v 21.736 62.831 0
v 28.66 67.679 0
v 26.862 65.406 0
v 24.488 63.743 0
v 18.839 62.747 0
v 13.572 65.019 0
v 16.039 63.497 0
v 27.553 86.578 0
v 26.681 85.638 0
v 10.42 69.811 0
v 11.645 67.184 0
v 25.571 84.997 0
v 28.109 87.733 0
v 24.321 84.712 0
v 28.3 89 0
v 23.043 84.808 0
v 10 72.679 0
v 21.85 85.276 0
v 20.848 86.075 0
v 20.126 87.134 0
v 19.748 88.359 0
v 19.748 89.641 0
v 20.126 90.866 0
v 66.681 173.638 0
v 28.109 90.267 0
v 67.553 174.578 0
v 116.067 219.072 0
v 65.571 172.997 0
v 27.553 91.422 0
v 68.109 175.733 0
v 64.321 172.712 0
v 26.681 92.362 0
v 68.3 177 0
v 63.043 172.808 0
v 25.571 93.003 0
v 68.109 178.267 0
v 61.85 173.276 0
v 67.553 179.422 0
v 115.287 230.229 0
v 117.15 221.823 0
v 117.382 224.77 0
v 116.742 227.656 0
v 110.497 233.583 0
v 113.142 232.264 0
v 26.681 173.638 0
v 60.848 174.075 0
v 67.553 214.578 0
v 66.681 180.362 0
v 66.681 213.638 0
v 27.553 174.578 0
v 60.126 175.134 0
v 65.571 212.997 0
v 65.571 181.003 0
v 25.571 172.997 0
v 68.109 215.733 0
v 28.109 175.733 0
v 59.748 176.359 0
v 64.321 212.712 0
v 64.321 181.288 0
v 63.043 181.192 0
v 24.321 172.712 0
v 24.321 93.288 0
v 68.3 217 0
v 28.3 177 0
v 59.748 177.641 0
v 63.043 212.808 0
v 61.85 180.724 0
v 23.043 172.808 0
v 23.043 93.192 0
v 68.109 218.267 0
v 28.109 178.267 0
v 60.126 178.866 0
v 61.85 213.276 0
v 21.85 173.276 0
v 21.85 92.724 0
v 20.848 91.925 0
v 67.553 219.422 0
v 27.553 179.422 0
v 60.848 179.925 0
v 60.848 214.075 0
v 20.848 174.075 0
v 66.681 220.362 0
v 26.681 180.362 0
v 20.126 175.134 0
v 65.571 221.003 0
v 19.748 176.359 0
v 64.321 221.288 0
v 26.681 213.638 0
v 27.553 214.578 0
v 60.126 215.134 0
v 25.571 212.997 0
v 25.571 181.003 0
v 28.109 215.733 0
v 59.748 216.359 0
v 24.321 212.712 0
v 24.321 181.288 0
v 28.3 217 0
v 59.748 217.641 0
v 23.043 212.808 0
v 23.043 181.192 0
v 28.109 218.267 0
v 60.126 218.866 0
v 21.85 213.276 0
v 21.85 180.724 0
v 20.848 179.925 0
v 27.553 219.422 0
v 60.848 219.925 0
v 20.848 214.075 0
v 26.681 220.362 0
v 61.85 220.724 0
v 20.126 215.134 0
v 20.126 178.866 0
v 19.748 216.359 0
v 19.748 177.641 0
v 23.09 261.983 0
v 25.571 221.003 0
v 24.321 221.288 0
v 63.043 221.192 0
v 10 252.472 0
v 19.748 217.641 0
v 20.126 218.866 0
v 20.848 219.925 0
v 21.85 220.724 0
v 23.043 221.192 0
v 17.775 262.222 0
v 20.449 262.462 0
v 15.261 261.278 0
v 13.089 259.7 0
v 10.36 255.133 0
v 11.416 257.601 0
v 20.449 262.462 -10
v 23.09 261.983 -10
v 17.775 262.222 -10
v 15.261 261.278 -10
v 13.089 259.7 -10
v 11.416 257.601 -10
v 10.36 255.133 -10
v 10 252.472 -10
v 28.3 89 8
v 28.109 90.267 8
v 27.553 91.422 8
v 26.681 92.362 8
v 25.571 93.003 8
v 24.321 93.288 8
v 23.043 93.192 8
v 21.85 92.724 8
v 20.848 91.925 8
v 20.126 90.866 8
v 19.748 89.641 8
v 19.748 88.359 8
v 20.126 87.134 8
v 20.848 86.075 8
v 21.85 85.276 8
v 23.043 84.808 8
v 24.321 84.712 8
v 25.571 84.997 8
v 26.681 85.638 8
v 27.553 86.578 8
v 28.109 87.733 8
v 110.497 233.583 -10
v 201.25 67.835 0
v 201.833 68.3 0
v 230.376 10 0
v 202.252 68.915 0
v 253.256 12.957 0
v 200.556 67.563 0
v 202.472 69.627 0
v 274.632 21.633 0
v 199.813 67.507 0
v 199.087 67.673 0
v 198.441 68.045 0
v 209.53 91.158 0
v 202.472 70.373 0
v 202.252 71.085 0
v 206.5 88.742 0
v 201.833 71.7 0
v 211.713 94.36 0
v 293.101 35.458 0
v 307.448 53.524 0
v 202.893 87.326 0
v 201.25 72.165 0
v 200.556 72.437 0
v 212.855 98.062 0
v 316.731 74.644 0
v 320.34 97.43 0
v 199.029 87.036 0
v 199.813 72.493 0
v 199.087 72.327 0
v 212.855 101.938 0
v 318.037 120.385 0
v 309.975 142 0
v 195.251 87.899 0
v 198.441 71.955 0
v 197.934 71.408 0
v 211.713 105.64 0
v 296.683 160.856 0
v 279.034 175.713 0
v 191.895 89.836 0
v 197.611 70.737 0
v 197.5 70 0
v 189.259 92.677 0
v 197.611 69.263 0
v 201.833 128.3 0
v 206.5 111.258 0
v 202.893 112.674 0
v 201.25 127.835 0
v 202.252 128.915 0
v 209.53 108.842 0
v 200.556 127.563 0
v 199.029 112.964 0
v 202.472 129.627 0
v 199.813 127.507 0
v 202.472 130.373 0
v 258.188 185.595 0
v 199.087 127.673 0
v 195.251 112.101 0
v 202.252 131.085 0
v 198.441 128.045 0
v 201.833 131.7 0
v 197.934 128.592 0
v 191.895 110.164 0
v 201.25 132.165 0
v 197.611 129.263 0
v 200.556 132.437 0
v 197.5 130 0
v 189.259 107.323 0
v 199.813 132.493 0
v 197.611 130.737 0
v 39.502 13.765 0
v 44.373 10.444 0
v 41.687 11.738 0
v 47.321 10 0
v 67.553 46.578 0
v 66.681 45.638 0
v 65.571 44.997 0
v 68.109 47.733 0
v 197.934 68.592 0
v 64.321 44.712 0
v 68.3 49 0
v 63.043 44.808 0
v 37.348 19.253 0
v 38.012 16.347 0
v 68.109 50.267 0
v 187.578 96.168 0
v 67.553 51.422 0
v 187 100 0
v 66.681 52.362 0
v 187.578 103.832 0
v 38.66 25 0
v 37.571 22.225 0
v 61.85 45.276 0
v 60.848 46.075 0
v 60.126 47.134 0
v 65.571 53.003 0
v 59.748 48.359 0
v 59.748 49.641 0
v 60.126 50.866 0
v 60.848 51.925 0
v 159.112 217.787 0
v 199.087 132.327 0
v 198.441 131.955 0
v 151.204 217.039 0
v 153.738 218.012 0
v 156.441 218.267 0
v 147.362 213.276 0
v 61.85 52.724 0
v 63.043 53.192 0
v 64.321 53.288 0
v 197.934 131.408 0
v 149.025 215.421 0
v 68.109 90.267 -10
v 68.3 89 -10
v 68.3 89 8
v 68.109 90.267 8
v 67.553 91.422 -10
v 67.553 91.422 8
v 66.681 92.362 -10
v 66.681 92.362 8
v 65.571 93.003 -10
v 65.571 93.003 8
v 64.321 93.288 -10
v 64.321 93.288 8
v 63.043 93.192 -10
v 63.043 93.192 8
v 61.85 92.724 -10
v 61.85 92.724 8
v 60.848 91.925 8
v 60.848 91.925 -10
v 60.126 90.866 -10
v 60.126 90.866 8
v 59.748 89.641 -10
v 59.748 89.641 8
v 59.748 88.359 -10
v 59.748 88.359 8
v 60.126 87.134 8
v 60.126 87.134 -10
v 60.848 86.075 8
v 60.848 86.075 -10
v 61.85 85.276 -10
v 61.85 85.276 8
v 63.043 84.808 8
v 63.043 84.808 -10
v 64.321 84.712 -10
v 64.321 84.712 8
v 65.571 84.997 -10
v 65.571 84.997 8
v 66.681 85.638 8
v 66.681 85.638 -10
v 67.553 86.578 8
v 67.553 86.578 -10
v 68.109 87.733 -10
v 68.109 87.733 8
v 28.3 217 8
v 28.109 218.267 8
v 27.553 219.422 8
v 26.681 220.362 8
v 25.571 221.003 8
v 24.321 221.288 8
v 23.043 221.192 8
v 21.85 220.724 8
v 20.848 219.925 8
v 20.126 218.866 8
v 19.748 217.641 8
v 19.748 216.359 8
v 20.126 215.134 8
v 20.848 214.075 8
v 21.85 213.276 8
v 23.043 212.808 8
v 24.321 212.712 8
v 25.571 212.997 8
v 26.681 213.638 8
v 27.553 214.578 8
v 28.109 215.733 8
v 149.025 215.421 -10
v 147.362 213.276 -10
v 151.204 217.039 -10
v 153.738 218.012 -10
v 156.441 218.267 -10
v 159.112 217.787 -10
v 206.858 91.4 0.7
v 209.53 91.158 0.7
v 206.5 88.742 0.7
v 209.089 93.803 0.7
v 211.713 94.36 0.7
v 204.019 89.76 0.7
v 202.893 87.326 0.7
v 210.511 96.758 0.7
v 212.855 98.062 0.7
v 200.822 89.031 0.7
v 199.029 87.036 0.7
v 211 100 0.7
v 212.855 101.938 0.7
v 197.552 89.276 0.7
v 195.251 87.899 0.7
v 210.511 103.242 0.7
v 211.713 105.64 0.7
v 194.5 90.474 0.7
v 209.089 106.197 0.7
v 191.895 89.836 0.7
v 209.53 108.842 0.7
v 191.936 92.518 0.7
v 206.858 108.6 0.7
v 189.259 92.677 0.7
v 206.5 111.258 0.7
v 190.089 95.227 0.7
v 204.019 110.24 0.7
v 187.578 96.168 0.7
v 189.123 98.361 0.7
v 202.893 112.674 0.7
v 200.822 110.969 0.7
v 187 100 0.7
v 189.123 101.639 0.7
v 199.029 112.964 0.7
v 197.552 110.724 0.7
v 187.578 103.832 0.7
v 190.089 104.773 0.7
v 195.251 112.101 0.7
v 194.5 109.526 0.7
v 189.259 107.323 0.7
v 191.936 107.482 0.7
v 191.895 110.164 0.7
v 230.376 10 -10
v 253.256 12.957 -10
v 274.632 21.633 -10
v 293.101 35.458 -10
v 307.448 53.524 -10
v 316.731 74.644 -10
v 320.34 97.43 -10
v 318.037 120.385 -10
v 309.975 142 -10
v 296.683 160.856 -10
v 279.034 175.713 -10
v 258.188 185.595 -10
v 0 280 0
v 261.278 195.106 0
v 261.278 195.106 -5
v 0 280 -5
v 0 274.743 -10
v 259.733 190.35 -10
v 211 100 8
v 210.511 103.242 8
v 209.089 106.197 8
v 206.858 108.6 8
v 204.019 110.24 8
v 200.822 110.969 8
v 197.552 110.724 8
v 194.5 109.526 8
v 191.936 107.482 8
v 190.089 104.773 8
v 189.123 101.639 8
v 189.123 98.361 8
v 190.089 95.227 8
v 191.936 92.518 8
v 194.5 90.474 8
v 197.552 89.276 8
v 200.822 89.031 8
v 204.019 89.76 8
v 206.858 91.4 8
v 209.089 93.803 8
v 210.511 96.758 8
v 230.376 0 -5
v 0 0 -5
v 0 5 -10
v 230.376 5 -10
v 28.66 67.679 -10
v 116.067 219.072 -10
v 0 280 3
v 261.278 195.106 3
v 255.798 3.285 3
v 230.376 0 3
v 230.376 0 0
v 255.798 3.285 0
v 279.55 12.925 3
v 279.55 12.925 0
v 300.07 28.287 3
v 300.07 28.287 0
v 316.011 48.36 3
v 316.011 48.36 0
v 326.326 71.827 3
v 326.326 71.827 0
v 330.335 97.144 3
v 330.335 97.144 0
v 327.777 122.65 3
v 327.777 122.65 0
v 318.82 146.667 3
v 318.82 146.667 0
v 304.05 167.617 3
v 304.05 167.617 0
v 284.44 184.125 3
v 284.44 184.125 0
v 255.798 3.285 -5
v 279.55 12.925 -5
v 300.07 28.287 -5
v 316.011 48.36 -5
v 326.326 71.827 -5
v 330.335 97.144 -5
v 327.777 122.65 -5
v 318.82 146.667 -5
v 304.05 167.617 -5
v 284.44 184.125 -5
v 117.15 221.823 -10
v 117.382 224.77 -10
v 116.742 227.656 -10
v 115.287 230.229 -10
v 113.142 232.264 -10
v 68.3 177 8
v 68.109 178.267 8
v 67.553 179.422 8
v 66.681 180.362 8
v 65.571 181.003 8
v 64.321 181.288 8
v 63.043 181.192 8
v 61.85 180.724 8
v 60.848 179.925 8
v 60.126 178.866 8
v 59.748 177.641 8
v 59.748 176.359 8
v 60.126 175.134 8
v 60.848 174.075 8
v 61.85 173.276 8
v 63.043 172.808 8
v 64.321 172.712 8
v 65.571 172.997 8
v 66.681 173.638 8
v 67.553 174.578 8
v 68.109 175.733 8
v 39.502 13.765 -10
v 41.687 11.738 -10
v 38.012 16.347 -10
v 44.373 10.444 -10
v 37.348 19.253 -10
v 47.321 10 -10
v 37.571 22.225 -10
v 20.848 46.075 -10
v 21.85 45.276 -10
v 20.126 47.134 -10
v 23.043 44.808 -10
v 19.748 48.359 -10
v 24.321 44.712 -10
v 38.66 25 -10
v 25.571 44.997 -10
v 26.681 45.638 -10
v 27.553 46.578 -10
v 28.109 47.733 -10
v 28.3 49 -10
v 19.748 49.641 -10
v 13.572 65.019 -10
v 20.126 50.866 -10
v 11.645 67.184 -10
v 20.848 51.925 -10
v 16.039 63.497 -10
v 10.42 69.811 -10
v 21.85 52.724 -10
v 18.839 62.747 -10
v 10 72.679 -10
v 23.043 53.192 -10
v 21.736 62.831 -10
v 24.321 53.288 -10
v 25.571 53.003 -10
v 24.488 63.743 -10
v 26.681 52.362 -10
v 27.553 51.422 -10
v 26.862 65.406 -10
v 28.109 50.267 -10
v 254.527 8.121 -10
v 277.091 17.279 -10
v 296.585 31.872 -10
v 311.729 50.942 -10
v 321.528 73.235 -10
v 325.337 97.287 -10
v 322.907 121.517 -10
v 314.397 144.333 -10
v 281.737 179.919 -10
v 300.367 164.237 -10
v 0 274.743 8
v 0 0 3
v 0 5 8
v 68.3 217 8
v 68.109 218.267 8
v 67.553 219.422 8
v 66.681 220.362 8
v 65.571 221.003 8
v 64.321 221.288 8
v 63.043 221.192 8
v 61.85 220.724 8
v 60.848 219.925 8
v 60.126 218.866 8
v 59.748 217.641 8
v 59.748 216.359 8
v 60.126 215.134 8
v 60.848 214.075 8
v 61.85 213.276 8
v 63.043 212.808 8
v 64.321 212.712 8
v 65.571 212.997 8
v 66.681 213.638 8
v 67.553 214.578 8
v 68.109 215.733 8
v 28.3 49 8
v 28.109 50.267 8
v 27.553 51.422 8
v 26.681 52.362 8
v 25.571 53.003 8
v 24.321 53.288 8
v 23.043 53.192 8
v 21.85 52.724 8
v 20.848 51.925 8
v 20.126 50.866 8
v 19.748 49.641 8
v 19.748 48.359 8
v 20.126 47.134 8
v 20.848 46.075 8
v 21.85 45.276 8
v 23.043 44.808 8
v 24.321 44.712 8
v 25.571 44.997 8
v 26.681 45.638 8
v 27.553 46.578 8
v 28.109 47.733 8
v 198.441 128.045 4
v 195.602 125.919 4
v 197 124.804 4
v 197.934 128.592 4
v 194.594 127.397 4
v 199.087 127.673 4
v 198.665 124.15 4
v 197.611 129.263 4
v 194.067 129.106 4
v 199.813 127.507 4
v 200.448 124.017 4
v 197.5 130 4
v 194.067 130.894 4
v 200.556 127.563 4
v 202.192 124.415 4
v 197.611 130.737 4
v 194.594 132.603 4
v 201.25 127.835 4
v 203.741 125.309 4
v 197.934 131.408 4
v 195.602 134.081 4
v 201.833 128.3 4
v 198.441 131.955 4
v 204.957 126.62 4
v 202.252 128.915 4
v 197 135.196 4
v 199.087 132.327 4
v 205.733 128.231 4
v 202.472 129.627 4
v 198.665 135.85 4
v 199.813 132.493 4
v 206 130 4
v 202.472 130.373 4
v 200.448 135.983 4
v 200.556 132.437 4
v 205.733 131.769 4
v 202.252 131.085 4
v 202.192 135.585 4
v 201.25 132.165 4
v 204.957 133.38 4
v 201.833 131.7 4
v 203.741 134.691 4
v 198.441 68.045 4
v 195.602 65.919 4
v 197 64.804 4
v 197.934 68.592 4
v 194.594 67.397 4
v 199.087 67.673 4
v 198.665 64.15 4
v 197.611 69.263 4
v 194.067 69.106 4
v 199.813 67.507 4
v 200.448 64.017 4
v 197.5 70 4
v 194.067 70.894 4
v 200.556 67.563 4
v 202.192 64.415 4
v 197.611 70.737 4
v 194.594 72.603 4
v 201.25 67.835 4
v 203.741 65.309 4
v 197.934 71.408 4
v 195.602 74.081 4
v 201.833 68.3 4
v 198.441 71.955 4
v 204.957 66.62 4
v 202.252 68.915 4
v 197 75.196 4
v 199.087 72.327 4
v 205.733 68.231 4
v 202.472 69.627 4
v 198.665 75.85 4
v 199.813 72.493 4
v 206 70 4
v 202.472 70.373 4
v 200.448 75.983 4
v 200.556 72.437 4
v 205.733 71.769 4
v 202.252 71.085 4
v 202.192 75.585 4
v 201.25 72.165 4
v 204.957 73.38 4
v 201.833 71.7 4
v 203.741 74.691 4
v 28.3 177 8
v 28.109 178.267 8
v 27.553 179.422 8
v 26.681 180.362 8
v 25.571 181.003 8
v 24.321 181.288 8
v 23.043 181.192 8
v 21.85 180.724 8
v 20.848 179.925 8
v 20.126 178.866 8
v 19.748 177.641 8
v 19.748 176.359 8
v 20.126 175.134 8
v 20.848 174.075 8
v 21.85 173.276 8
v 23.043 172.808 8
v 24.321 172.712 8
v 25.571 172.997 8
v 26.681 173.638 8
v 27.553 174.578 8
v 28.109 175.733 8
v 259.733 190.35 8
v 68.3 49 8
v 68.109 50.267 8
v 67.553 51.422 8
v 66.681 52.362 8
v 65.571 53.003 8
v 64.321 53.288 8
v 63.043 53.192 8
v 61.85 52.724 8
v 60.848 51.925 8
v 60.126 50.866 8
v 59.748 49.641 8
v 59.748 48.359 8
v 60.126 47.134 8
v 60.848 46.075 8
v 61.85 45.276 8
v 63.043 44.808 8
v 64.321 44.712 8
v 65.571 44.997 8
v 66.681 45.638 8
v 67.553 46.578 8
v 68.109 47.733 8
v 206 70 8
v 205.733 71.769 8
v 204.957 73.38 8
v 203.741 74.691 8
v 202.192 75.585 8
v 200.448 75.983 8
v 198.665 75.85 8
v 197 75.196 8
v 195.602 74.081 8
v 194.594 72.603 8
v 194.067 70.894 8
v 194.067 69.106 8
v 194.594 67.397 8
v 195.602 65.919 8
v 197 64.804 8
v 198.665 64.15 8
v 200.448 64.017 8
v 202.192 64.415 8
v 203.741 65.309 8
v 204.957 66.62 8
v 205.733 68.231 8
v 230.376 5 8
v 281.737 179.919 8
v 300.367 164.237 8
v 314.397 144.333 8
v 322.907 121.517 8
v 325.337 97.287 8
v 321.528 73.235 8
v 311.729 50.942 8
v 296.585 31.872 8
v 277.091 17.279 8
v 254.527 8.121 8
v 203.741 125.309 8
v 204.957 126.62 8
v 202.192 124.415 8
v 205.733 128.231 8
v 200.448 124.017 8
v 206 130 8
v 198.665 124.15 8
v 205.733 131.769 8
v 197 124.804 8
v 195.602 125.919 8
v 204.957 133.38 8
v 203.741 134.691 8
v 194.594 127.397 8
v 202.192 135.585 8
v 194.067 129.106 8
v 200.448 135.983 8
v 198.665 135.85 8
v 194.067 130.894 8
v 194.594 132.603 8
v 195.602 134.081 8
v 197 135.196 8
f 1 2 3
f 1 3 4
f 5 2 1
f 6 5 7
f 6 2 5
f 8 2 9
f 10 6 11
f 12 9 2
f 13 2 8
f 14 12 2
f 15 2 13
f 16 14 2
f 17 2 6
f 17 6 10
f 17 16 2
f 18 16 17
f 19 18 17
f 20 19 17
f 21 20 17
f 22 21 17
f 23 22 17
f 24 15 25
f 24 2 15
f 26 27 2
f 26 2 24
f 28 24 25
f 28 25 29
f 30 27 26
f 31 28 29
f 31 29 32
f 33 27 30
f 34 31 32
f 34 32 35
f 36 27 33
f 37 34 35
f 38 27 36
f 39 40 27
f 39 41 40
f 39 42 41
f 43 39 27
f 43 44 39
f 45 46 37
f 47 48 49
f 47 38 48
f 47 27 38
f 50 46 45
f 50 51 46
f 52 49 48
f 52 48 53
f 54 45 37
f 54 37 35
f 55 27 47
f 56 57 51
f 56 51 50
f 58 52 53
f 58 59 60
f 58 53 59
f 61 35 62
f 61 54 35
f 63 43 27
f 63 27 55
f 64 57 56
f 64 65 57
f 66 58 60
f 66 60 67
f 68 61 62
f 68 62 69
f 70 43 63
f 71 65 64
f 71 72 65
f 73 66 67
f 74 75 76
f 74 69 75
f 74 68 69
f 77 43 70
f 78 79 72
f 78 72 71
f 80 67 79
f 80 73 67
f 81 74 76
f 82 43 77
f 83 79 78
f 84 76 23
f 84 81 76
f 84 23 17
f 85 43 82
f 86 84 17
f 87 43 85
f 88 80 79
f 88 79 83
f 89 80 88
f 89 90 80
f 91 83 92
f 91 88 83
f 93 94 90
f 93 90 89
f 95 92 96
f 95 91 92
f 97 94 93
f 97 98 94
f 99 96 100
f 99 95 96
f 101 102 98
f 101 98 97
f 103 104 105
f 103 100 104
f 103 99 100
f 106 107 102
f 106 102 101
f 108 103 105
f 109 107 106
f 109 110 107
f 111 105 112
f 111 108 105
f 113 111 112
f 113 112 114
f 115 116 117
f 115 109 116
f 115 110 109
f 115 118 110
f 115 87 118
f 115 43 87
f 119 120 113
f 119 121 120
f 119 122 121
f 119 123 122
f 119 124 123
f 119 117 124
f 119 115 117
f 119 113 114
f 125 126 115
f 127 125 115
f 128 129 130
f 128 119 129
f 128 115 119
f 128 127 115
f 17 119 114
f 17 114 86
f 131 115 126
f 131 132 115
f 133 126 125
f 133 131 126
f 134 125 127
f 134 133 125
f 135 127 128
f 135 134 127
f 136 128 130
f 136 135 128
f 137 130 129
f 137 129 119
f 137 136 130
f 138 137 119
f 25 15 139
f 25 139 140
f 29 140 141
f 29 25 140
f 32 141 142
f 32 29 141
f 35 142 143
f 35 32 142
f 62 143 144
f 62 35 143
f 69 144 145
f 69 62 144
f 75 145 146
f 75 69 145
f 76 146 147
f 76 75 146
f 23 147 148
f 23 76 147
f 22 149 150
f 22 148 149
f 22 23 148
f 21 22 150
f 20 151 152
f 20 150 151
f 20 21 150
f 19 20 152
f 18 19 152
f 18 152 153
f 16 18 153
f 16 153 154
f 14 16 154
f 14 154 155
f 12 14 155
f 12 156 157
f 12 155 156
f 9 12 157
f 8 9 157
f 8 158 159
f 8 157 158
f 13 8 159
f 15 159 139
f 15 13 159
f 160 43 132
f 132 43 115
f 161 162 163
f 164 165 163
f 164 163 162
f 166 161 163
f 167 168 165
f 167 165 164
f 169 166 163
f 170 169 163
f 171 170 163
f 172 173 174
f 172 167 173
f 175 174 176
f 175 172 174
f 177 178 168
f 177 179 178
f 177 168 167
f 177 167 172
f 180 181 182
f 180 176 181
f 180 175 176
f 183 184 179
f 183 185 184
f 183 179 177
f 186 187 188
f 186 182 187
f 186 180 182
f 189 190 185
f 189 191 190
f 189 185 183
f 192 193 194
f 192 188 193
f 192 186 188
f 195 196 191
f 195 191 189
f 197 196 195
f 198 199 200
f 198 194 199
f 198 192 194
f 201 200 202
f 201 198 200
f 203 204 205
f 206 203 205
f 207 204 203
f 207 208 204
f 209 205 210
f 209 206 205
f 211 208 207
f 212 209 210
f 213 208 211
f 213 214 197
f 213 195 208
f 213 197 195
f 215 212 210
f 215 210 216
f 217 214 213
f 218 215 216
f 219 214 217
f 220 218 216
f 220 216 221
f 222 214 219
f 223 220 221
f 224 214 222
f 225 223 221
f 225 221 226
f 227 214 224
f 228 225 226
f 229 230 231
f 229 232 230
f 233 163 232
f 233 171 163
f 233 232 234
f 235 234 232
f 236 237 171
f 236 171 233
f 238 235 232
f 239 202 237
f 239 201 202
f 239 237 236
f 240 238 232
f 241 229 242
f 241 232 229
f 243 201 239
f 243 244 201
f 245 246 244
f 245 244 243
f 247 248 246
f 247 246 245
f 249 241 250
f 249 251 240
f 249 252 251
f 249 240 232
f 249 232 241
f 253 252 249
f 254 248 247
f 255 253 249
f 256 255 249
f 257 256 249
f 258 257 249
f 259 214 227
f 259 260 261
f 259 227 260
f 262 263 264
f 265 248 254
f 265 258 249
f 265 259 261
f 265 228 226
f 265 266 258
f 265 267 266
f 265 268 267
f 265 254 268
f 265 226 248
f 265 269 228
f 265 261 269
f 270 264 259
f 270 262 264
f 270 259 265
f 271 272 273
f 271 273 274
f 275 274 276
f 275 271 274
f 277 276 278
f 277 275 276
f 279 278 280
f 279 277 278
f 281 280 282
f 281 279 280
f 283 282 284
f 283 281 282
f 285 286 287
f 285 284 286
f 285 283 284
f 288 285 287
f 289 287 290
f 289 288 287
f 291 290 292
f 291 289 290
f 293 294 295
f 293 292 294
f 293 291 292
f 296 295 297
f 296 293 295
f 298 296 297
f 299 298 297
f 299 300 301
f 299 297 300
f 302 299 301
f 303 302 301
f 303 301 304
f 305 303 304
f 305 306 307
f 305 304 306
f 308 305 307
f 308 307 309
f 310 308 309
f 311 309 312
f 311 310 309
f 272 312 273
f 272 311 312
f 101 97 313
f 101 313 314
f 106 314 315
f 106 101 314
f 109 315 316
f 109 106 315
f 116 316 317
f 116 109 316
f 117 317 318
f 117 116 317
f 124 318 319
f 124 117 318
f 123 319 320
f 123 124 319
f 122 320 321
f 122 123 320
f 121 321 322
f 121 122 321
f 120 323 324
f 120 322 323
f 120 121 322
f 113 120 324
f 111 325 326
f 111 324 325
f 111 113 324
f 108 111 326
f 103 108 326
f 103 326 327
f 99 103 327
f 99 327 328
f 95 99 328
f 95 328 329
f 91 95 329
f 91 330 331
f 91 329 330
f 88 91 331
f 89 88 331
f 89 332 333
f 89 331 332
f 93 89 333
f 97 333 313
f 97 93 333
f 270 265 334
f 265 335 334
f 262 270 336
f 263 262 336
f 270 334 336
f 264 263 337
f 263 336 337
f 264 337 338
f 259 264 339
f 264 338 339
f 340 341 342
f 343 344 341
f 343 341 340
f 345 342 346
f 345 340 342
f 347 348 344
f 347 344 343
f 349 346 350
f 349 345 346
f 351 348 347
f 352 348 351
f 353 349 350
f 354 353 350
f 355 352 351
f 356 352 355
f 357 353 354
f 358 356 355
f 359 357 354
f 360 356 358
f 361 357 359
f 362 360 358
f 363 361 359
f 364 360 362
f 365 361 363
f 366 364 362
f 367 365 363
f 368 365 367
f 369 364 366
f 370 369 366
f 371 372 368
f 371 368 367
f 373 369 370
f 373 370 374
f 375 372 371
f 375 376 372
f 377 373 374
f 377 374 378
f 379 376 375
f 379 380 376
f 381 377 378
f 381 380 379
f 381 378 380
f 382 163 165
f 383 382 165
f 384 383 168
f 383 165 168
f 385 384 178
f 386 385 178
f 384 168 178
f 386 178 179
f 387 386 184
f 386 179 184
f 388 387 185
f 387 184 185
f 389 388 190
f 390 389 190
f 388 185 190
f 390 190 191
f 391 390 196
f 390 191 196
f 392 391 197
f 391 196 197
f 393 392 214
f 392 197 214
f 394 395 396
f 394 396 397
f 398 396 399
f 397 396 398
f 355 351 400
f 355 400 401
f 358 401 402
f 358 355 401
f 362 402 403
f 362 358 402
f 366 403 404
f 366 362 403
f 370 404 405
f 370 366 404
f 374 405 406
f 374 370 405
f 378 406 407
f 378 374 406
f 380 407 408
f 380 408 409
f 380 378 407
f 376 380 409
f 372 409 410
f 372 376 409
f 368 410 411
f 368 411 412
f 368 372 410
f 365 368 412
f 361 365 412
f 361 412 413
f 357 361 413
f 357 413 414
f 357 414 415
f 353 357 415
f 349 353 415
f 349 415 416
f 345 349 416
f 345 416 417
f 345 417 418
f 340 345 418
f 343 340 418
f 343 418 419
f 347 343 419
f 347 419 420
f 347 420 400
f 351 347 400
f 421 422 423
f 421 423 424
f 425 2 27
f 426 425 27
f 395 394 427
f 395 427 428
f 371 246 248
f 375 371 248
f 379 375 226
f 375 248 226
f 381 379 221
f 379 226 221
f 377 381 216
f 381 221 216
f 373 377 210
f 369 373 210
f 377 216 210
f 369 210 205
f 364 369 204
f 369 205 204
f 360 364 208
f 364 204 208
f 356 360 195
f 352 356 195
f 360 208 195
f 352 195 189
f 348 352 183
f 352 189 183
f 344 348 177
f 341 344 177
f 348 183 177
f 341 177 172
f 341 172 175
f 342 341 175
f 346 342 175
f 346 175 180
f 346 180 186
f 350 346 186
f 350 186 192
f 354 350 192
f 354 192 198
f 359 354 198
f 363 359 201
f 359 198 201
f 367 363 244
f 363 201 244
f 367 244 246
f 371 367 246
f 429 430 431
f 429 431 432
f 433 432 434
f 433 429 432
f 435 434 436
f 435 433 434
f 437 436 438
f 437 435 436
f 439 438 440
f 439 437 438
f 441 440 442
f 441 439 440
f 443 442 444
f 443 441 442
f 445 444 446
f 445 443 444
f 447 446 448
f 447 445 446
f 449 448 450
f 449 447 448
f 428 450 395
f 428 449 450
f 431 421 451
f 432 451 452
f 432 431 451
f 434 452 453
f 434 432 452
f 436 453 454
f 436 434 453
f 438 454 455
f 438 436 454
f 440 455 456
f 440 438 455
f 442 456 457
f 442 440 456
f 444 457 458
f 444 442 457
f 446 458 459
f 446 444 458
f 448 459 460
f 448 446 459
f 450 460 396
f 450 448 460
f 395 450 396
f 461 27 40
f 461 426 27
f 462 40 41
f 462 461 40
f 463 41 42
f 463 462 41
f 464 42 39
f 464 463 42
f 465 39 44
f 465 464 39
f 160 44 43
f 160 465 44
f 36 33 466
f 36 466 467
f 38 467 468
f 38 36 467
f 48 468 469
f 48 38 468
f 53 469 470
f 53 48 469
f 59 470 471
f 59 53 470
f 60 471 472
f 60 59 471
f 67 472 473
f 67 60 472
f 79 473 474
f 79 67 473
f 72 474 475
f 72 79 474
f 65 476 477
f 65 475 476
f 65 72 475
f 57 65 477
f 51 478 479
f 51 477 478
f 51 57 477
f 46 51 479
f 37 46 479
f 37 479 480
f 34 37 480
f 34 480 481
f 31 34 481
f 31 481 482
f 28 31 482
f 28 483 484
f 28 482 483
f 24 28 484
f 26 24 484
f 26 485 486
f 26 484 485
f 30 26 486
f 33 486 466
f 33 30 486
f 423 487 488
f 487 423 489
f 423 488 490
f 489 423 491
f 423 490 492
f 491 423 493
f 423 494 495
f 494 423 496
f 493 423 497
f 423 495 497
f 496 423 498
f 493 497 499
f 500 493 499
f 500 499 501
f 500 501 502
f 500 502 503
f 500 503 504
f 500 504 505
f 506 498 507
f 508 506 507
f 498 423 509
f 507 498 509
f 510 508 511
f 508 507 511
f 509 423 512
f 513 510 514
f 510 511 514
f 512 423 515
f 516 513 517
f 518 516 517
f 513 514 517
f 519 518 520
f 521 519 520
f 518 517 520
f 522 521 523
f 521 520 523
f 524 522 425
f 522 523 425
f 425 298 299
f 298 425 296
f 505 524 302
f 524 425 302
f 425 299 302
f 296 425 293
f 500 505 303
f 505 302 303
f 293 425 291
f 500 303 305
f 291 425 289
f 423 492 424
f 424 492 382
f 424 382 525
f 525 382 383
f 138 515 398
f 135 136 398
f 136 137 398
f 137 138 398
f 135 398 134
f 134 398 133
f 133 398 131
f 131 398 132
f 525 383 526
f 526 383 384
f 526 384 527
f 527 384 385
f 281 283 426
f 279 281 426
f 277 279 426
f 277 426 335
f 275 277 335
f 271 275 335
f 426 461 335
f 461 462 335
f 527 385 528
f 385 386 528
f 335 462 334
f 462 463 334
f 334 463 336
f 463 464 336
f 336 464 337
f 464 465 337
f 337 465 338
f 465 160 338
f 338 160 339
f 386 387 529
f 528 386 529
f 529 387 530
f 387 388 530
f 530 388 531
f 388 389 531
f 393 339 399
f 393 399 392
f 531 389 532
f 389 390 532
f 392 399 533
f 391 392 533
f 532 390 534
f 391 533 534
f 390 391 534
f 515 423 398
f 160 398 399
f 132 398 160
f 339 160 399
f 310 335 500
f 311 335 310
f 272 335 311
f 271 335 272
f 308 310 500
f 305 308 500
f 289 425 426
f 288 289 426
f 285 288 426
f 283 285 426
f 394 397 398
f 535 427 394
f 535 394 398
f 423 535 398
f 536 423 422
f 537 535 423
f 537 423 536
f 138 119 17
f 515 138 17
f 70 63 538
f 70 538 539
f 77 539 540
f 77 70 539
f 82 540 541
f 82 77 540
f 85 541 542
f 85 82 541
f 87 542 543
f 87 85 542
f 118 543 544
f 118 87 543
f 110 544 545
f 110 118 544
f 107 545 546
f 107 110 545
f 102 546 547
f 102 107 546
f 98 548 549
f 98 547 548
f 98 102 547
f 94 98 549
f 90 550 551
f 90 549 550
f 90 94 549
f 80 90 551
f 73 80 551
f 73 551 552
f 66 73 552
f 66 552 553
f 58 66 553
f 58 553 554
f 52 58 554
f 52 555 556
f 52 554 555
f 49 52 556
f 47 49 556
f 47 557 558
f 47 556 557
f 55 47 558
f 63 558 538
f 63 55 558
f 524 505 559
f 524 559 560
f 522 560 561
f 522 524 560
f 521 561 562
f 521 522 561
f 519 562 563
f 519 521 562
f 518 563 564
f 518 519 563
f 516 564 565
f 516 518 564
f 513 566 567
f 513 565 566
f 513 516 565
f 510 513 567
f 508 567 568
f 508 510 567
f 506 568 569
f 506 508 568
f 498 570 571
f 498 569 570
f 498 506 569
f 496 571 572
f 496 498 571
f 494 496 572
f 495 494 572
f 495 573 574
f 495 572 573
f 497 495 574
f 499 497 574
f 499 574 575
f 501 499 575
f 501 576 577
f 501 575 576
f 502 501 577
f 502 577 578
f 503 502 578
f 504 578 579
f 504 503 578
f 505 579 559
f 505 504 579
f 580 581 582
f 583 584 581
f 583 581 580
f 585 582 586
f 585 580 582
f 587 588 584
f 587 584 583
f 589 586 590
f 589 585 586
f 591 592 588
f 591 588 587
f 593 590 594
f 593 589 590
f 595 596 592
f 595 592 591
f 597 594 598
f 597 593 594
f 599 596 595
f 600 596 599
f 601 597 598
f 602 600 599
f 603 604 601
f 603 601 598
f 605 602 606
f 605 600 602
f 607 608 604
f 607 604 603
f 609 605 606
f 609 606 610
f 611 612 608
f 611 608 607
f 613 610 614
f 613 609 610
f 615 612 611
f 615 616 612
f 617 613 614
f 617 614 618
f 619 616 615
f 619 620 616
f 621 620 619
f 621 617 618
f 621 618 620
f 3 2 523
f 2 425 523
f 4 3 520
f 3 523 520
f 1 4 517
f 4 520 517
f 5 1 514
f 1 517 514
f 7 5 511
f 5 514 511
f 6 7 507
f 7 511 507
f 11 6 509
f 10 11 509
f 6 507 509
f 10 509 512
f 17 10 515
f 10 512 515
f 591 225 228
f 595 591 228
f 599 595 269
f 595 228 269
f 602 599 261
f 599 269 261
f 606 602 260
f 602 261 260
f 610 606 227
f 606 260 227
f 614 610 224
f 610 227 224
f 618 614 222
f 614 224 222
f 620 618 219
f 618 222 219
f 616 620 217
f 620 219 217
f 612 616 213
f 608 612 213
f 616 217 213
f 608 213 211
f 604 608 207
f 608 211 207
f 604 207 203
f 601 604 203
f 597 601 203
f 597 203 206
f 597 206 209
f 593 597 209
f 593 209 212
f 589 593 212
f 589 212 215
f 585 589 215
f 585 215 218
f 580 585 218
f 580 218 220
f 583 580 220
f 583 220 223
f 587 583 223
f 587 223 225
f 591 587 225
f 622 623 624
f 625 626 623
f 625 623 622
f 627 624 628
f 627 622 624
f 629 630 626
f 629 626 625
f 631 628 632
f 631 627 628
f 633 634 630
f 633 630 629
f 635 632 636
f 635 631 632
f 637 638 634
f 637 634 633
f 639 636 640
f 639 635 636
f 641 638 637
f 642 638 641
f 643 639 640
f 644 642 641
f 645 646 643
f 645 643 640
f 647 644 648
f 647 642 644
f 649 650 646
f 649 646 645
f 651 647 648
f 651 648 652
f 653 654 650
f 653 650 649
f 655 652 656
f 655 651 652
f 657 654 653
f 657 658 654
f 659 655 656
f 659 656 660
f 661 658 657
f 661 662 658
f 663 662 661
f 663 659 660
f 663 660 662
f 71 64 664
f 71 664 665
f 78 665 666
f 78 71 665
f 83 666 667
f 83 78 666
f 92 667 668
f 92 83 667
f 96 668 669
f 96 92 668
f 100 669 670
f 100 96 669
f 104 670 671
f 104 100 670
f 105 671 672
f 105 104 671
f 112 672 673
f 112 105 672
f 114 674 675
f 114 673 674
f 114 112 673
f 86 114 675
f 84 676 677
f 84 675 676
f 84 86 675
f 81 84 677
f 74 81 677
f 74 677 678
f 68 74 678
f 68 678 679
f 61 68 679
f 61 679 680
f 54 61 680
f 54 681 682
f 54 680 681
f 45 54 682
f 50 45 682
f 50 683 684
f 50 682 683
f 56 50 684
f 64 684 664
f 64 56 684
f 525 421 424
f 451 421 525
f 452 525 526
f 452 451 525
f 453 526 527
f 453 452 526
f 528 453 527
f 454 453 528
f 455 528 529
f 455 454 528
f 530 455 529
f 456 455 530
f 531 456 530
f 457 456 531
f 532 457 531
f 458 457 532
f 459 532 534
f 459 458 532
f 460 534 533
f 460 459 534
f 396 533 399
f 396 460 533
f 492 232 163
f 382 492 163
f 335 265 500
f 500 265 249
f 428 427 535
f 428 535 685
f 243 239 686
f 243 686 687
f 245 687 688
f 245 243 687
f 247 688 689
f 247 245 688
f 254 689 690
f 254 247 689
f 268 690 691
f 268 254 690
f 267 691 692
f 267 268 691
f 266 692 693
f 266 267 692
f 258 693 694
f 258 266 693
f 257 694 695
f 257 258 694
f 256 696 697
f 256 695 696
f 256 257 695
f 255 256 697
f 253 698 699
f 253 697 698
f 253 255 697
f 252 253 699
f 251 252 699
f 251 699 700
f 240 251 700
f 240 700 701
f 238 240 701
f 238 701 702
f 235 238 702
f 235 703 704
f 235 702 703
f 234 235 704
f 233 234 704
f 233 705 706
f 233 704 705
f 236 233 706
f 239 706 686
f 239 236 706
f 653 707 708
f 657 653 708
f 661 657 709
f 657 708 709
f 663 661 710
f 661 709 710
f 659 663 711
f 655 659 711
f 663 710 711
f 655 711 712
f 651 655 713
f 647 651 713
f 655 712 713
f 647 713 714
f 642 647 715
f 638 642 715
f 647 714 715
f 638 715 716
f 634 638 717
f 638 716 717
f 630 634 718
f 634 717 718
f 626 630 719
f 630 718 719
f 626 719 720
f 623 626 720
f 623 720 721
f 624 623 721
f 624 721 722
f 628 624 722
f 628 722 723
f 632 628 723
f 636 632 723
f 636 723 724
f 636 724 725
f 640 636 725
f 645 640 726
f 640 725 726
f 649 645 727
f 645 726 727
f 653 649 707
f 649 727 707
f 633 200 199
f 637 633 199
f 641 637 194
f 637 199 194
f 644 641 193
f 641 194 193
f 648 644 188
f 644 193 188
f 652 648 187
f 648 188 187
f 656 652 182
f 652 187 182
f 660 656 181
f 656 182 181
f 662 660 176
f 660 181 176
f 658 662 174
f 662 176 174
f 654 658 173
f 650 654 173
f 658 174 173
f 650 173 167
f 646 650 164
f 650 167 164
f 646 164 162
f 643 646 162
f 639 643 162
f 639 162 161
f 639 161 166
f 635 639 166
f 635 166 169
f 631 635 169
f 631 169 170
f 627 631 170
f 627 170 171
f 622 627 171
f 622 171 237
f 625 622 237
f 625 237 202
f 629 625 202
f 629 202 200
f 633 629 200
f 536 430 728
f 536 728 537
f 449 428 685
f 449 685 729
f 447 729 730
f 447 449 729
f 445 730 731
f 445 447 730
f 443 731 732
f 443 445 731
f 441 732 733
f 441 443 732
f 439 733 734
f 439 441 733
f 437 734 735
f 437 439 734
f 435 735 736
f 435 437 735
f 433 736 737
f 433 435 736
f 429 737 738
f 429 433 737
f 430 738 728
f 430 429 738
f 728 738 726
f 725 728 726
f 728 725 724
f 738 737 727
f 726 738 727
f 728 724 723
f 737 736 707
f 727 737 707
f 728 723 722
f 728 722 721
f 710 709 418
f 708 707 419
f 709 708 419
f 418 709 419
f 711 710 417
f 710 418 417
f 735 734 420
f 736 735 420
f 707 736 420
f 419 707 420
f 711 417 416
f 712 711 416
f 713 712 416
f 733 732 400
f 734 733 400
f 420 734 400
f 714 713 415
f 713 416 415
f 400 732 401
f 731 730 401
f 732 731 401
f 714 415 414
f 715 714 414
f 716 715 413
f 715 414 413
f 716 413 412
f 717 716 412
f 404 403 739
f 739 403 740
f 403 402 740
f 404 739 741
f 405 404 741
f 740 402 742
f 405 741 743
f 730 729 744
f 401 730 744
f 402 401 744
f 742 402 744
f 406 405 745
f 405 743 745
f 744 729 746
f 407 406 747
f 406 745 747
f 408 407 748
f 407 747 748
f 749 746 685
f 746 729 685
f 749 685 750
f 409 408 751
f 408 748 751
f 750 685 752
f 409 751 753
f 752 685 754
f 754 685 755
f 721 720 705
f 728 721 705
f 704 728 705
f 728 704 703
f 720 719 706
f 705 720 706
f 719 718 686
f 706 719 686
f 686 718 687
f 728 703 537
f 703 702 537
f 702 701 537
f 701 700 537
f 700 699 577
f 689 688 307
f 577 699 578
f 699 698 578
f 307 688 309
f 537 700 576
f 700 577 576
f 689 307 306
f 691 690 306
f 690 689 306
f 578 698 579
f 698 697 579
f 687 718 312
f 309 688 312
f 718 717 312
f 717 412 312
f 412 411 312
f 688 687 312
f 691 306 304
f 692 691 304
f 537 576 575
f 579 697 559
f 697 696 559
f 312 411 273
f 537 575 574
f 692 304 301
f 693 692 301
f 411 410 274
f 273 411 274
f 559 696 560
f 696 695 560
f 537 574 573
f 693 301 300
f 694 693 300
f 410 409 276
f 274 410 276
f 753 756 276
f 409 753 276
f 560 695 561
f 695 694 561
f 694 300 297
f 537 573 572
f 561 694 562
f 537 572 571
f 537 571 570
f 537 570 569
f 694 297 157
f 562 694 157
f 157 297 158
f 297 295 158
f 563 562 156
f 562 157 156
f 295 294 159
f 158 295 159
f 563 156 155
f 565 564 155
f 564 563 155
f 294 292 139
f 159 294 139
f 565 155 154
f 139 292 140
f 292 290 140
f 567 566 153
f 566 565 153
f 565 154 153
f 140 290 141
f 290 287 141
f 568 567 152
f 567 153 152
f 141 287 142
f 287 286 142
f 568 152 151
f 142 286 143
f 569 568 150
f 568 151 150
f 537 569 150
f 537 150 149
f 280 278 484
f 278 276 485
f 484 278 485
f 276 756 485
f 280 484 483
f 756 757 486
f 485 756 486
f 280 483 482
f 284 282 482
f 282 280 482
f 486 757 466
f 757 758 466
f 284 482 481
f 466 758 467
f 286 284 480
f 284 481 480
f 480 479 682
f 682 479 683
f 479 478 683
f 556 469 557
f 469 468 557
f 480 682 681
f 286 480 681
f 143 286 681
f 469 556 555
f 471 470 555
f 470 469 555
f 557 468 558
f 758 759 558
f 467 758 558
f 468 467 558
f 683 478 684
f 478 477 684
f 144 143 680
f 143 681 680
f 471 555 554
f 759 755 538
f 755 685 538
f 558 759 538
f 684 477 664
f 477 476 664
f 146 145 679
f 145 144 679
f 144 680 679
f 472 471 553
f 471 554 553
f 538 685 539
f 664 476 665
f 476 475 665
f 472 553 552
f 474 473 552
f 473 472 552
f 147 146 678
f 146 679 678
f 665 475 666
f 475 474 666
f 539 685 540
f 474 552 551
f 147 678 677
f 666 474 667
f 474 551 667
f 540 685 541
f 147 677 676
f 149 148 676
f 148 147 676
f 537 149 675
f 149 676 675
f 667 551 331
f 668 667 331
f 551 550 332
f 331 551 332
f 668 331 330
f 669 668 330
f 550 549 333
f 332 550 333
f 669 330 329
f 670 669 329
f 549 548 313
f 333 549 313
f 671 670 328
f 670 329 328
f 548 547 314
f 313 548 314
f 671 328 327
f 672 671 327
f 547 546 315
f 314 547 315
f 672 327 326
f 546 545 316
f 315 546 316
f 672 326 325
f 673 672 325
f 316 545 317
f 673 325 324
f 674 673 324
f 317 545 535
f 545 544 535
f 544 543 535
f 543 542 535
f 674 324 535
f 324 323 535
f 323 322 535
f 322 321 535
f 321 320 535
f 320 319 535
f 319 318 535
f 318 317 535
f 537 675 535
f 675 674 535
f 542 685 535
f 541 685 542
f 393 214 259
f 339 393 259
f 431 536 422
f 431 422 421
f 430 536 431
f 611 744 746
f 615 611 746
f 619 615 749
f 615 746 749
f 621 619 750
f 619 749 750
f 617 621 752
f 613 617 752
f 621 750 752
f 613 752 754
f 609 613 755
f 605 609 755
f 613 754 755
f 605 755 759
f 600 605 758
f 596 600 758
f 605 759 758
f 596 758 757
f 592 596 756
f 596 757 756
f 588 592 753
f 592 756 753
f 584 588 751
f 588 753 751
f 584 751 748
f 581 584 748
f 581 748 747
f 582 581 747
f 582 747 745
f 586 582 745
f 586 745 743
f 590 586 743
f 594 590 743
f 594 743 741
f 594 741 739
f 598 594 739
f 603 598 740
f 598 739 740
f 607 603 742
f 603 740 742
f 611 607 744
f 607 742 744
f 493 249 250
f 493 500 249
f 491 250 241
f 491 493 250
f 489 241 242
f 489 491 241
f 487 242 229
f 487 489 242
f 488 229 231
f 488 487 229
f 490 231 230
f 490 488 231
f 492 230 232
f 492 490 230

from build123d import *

# Parameters (mm, degrees)
SKETCH_1_R               = 11
EXTRUDE_1_DEPTH          = 8
FILLET_1_R               = 100
EXTRUDE_2_DEPTH          = 10
FILLET_2_R               = 10
CHAMFER_1_SIZE           = 5
SKETCH_4_R               = 13
CUT_EXTRUDE_1_DEPTH      = 0.7
SKETCH_5_R               = 2.5
CUT_EXTRUDE_2_DEPTH      = 434.184093957
SKETCH_6_R               = 6
CUT_EXTRUDE_3_DEPTH      = 4
CUT_EXTRUDE_4_DEPTH      = 434.442567426
CUT_EXTRUDE_4_DEPTH_BACK = 434.442567426
SKETCH_7_R               = 4.3


with BuildPart() as part:
    # 草图1 → 凸台-拉伸1 (new body)
    with BuildSketch(Plane.XY):
        Polygon((0, 0), (0, 280), (861.751390409, 0), align=None)
        with Locations((200, 100)):
            Circle(SKETCH_1_R, mode=Mode.SUBTRACT)
    extrude(amount=EXTRUDE_1_DEPTH)

    # 圆角1
    fillet_1_edges = [part.edges().sort_by_distance(p)[0] for p in [
        (861.751390409, 0, 4),
    ]]
    fillet(fillet_1_edges, radius=FILLET_1_R)

    # 草图2 → 凸台-拉伸2 (add)
    with BuildSketch(Plane.XY):
        with BuildLine():
            Line((0, 280), (0, 0))
            Line((0, 0), (230.376238942, 0))
            ThreePointArc((230.376238942, 0), (329.145073001, 84.356553496), (261.277938379, 195.10565163))
            Line((261.277938379, 195.10565163), (0, 280))
        make_face()
        with BuildLine():
            Line((230.376238942, 10), (30, 10))
            Line((30, 10), (151.410485182, 220.289128906))
            Line((151.410485182, 220.289128906), (258.187768435, 185.595086467))
            ThreePointArc((258.187768435, 185.595086467), (319.268189595, 85.920898146), (230.376238942, 10))
        make_face(mode=Mode.SUBTRACT)
        Polygon((10, 35.358983849), (10, 266.236180795), (122.241374643, 229.766747442), align=None, mode=Mode.SUBTRACT)
    extrude(amount=-EXTRUDE_2_DEPTH)

    # 圆角2
    fillet_2_edges = [part.edges().sort_by_distance(p)[0] for p in [
        (10, 35.358983849, -5),
        (30, 10, -5),
        (122.241374643, 229.766747442, -5),
        (151.410485182, 220.289128906, -5),
        (10, 266.236180795, -5),
    ]]
    fillet(fillet_2_edges, radius=FILLET_2_R)

    # 倒角1
    chamfer_1_edges = [part.edges().sort_by_distance(p)[0] for p in [
        (115.188119471, 0, 8),
        (130.63896919, 237.552825815, 8),
        (329.145073001, 84.356553496, 8),
        (130.63896919, 237.552825815, -10),
        (115.188119471, 0, -10),
        (329.145073001, 84.356553496, -10),
    ]]
    chamfer(chamfer_1_edges, length=CHAMFER_1_SIZE)

    # 草图4 → 切除-拉伸1 (cut)
    with BuildSketch(Plane(origin=(0, 0, 0), x_dir=(-1, 0, 0), z_dir=(0, 0, -1))):
        with Locations((-200, 100)):
            Circle(SKETCH_4_R)
    extrude(amount=-CUT_EXTRUDE_1_DEPTH, mode=Mode.SUBTRACT)

    # 草图5 → 切除-拉伸2 (cut, through all)
    with BuildSketch(Plane(origin=(0, 0, 0), x_dir=(-1, 0, 0), z_dir=(0, 0, -1))):
        with Locations((-200, 130)):
            Circle(SKETCH_5_R)
        with Locations((-200, 70)):
            Circle(SKETCH_5_R)
    extrude(amount=-CUT_EXTRUDE_2_DEPTH, mode=Mode.SUBTRACT)

    # 草图6 → 切除-拉伸3 (cut)
    with BuildSketch(Plane.XY.offset(8)):
        with Locations((200, 130)):
            Circle(SKETCH_6_R)
        with Locations((200, 70)):
            Circle(SKETCH_6_R)
    extrude(amount=-CUT_EXTRUDE_3_DEPTH, mode=Mode.SUBTRACT)

    # 草图7 → 切除-拉伸4 (cut, two sides: drawn at the far end of the back side and taken through both)
    with BuildSketch(Plane.XY.offset(8).offset(-CUT_EXTRUDE_4_DEPTH_BACK)):
        with Locations((64, 217)):
            Circle(SKETCH_7_R)
        with Locations((24, 217)):
            Circle(SKETCH_7_R)
        with Locations((64, 177)):
            Circle(SKETCH_7_R)
        with Locations((24, 177)):
            Circle(SKETCH_7_R)
        with Locations((64, 89)):
            Circle(SKETCH_7_R)
        with Locations((24, 89)):
            Circle(SKETCH_7_R)
        with Locations((64, 49)):
            Circle(SKETCH_7_R)
        with Locations((24, 49)):
            Circle(SKETCH_7_R)
    extrude(amount=CUT_EXTRUDE_4_DEPTH + CUT_EXTRUDE_4_DEPTH_BACK, mode=Mode.SUBTRACT)


solid = part.part
